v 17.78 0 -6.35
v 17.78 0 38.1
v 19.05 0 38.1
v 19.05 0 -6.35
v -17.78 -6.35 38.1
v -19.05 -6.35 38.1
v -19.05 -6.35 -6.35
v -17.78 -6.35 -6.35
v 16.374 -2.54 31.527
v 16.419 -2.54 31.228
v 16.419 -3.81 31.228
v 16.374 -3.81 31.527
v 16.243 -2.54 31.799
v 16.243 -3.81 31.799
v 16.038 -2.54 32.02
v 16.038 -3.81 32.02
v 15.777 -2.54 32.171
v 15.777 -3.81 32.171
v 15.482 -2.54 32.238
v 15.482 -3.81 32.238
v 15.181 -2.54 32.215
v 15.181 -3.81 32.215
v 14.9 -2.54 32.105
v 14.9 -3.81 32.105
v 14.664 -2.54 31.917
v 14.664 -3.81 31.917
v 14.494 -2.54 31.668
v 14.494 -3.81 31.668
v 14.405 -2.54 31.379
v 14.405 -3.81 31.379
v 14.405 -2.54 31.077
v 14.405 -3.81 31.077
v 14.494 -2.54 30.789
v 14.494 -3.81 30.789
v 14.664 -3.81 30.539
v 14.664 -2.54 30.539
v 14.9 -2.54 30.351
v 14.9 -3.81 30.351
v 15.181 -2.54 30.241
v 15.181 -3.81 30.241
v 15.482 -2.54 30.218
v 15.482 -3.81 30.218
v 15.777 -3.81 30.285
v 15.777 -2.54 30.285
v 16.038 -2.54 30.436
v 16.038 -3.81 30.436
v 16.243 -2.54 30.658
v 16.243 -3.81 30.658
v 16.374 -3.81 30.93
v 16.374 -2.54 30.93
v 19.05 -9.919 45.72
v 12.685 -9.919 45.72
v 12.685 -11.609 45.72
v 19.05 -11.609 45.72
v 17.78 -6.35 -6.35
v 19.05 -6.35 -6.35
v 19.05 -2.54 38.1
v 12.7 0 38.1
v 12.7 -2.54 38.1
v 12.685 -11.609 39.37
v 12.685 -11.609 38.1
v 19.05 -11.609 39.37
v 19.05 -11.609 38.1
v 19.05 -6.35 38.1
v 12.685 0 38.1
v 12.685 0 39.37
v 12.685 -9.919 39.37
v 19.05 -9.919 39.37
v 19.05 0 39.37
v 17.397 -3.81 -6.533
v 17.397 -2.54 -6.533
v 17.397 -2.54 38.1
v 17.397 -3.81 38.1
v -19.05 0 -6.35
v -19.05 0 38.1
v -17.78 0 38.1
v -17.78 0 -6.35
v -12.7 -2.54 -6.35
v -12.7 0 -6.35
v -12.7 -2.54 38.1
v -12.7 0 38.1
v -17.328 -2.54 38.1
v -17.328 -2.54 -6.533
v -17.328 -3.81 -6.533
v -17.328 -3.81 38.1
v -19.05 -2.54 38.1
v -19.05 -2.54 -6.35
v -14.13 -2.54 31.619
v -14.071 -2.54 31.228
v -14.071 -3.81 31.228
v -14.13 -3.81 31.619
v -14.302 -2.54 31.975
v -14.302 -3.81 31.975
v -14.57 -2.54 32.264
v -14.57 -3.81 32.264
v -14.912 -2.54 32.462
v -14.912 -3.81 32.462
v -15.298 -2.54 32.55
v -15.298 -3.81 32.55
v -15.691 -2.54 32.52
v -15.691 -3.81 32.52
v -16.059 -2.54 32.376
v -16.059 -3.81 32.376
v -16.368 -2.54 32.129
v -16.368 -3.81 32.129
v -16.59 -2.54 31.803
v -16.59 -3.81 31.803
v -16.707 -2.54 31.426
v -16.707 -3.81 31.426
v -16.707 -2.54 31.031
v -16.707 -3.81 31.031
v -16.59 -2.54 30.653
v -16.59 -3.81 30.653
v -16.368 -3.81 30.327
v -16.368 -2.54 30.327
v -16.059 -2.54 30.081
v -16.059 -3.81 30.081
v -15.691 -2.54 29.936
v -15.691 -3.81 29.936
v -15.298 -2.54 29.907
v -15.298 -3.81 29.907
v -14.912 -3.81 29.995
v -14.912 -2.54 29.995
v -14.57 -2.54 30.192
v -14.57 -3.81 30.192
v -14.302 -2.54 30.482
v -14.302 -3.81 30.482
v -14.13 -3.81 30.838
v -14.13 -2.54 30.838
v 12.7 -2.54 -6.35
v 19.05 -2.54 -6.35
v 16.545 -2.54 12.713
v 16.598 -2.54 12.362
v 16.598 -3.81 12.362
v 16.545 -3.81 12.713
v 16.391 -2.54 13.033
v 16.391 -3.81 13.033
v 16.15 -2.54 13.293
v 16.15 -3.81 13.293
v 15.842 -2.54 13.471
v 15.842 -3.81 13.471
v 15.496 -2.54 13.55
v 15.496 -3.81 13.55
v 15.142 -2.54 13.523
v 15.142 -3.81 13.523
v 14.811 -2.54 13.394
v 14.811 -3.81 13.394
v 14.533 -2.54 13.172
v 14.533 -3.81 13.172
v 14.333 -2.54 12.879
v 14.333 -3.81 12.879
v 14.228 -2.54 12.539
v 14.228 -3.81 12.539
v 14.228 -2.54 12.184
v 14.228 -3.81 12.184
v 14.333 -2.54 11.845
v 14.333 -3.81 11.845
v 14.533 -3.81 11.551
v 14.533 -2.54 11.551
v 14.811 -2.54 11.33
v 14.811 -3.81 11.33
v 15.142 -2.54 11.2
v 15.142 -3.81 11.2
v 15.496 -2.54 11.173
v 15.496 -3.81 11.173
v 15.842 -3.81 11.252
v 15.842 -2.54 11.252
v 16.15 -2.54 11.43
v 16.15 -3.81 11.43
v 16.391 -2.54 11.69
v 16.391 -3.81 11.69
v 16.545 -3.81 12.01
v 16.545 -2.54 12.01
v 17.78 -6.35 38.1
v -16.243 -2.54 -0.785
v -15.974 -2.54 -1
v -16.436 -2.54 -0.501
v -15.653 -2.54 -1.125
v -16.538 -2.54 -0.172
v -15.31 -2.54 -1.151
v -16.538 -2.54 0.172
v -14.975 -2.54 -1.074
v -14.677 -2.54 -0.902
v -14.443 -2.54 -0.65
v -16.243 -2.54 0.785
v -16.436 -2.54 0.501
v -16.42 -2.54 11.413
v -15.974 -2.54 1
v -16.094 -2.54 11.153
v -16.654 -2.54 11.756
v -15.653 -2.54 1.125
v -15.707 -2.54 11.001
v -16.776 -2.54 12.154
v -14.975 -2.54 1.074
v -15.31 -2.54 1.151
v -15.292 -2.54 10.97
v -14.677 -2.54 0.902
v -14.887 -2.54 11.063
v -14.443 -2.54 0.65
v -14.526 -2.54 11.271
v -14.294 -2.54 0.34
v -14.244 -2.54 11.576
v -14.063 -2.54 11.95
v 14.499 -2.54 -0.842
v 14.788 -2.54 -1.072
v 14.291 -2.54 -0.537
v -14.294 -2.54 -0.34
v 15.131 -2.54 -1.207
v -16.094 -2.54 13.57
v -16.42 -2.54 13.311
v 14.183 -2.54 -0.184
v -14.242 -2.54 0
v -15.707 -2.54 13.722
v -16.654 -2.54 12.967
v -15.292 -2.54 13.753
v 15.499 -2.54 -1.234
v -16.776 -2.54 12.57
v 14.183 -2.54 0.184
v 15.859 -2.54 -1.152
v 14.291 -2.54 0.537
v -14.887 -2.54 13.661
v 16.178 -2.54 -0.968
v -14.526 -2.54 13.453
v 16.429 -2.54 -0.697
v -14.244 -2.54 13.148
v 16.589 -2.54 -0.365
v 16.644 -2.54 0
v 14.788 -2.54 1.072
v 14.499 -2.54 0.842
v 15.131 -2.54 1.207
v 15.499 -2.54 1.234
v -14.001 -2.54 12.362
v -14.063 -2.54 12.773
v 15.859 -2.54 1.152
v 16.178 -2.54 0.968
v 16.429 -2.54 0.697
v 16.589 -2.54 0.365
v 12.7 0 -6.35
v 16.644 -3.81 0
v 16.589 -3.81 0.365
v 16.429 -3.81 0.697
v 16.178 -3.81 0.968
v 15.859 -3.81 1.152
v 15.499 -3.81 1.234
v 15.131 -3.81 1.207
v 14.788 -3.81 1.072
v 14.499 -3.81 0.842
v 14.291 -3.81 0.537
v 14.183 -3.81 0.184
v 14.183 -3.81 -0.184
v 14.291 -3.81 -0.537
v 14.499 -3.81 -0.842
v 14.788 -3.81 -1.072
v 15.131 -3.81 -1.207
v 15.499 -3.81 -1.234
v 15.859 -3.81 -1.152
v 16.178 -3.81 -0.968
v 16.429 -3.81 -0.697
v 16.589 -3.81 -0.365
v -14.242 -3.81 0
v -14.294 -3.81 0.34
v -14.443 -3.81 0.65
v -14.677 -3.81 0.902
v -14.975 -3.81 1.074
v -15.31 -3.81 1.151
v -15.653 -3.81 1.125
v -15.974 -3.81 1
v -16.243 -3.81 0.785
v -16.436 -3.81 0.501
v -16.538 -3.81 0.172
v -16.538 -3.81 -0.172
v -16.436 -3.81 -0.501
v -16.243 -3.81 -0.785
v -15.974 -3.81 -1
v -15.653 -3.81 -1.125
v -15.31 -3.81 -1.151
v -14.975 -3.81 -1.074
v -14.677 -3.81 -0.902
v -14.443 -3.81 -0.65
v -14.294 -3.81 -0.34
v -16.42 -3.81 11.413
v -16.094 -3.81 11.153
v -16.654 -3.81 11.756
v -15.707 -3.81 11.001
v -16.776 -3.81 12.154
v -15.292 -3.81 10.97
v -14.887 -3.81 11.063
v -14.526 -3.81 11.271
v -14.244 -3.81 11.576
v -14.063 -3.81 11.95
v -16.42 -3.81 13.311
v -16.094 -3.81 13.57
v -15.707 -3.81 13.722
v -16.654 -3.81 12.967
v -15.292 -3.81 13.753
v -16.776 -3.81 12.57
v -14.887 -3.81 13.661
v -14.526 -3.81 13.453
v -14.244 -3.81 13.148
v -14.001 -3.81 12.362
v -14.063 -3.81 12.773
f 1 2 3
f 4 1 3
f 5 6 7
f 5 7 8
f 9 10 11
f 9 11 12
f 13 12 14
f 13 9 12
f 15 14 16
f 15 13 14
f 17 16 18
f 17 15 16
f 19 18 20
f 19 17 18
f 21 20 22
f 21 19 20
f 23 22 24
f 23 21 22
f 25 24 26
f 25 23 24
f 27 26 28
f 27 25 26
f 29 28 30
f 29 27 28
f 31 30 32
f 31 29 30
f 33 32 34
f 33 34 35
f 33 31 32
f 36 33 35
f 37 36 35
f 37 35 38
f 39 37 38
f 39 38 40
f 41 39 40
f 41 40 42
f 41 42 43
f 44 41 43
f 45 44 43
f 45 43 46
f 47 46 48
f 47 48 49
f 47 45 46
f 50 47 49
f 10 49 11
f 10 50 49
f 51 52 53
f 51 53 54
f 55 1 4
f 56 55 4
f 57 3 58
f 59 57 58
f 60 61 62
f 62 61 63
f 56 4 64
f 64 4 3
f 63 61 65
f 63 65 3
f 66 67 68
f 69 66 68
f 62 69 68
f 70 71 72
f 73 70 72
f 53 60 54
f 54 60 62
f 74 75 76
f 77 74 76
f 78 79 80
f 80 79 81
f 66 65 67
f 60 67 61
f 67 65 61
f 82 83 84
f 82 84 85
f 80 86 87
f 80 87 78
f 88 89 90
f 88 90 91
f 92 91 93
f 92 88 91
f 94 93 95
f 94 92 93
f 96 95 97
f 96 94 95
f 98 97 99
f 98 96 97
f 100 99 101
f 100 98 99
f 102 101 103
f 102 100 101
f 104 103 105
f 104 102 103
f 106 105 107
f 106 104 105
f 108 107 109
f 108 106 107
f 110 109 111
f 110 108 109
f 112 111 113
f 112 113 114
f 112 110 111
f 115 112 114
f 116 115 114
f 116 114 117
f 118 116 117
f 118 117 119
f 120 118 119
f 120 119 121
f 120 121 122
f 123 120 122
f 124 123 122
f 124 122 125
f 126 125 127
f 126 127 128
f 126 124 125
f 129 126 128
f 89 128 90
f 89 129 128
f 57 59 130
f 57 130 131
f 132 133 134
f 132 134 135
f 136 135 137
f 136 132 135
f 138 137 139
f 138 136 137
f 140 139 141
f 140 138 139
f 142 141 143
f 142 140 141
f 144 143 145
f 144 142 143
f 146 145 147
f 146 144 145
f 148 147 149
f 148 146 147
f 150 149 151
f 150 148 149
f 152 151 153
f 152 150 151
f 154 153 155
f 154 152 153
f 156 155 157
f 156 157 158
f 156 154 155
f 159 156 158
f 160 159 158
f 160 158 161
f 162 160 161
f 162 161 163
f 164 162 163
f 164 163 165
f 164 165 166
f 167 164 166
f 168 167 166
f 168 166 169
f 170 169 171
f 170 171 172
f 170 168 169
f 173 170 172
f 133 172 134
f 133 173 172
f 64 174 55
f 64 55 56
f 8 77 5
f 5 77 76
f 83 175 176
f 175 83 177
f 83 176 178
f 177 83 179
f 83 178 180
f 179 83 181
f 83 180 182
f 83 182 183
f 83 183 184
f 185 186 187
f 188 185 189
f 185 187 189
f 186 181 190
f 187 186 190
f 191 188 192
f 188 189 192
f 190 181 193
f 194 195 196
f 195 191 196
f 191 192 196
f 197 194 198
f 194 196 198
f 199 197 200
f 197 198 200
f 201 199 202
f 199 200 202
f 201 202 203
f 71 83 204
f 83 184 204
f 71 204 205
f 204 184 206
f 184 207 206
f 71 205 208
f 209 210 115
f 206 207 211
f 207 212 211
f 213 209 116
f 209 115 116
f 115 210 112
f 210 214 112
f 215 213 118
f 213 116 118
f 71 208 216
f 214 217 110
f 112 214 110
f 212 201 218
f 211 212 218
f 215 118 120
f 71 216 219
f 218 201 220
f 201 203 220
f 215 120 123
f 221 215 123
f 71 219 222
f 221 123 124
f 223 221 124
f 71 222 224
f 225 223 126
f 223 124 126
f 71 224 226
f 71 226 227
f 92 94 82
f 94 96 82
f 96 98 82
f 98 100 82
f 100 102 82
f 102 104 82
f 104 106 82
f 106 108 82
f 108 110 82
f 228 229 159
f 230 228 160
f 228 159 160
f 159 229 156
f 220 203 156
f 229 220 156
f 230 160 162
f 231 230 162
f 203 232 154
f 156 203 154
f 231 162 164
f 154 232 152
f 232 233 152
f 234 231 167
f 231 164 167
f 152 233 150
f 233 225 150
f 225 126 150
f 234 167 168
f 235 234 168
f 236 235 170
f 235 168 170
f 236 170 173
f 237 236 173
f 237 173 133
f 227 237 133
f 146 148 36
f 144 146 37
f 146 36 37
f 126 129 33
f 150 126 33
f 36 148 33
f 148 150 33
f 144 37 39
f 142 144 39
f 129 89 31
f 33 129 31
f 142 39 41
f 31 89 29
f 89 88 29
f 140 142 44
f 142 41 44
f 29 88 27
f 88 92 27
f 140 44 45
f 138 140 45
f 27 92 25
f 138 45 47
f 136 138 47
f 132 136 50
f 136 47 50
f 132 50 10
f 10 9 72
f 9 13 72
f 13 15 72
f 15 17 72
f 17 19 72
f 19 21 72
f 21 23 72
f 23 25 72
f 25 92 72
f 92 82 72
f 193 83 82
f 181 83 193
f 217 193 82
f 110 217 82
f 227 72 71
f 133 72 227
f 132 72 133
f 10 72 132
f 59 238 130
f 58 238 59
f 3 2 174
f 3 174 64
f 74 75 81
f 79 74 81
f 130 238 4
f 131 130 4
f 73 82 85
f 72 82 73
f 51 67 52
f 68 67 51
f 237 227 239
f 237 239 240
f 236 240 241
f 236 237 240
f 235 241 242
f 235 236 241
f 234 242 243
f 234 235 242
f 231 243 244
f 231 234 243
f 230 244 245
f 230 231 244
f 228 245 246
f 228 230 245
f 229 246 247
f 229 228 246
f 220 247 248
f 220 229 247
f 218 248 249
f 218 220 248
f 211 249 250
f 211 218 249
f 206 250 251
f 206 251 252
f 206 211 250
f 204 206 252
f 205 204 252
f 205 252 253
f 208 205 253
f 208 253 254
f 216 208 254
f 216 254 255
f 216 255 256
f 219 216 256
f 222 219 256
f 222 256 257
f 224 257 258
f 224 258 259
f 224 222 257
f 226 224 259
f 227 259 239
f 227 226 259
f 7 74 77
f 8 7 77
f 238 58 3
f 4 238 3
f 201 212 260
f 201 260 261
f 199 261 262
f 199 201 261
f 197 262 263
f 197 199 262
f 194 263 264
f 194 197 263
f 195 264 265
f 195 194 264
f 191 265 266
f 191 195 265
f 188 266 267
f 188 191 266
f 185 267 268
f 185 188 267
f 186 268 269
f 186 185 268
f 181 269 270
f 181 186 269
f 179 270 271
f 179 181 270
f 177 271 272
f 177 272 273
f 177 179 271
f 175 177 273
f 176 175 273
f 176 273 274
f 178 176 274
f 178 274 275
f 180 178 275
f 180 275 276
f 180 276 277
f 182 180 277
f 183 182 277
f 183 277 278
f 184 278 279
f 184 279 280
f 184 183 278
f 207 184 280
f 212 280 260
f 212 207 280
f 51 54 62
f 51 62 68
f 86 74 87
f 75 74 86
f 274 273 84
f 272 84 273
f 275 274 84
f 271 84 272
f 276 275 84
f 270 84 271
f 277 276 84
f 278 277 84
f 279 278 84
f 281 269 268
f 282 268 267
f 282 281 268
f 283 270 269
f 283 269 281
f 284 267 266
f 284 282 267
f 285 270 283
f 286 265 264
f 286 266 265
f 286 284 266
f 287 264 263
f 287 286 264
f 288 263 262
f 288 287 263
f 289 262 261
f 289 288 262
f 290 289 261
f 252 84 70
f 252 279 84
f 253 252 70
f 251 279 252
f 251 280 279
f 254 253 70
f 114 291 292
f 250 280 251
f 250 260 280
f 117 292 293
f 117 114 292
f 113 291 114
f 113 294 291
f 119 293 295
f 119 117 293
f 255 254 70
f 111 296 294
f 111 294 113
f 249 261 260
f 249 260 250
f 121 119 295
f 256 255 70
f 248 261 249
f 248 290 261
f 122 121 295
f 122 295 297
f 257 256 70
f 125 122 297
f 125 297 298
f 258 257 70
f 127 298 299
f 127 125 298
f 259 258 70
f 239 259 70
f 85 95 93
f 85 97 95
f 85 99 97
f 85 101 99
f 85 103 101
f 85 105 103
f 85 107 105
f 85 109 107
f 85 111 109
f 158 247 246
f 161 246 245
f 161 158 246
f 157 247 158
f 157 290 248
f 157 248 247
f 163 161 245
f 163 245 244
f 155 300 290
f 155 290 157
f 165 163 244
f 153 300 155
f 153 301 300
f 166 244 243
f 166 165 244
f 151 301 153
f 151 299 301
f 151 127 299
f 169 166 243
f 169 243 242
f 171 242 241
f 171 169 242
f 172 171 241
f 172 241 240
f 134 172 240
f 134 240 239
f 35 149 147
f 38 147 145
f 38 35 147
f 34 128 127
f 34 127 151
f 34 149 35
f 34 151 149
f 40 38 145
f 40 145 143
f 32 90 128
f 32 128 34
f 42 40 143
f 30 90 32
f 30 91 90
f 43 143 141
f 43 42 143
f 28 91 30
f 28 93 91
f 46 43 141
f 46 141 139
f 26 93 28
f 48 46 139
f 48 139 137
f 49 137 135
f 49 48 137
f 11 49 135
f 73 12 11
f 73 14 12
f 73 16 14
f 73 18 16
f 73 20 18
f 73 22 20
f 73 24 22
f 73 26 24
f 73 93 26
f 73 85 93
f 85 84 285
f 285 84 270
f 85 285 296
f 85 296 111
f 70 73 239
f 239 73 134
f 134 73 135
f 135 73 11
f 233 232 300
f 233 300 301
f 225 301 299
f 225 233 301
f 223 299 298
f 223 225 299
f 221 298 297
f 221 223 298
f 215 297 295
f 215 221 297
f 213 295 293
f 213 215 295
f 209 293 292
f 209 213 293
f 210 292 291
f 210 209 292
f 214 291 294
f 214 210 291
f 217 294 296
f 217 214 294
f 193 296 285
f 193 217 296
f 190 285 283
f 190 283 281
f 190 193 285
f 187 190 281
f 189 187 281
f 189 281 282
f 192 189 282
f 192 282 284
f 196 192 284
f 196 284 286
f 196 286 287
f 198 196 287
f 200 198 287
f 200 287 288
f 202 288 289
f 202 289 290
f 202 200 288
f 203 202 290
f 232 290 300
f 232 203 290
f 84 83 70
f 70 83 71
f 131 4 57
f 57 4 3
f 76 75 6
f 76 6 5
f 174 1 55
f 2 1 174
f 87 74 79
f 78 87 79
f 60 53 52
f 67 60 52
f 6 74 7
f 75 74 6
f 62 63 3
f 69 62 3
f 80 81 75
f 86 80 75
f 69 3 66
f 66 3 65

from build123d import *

# Parameters (mm, degrees)
F0_W     = 1.27
F0_H     = 44.45
F1_DEPTH = 6.35
F0_W_2   = 5.08
F2_DEPTH = 2.54
F3_W     = 34.725336
F3_H     = 44.633469
F3_R     = 1.154262
F3_R_2   = 1.395496
F3_R_3   = 1.237767
F3_R_4   = 1.191646
F3_R_5   = 1.325115
F3_R_6   = 1.012659
F4_DEPTH = 1.27
F5_W     = 6.35
F5_H     = 2.54
F6_DEPTH = 1.27
F7_W     = 6.364727
F7_H     = 1.689253
F8_DEPTH = 6.35


with BuildPart() as f1:
    # F0 (on Front) → F1 (new body)
    with BuildSketch(Plane.XZ):
        with Locations((-18.415, 15.875)):
            Rectangle(F0_W, F0_H)
        with Locations((18.415, 15.875)):
            Rectangle(F0_W, F0_H)
    extrude(amount=F1_DEPTH)


with BuildPart() as f2:
    # F0 (on Front) → F2 (new body)
    with BuildSketch(Plane.XZ):
        with Locations((-18.415, 15.875)):
            Rectangle(F0_W, F0_H)
        with Locations((-15.24, 15.875)):
            Rectangle(F0_W_2, F0_H)
        with Locations((15.24, 15.875)):
            Rectangle(F0_W_2, F0_H)
        with Locations((18.415, 15.875)):
            Rectangle(F0_W, F0_H)
    extrude(amount=F2_DEPTH)


with BuildPart() as f4:
    # F3 (on face) → F4 (new body)
    with BuildSketch(Plane.XZ.offset(2.54)):
        with Locations((0.034808, 15.783266)):
            Rectangle(F3_W, F3_H)
        with Locations((-15.396533, 0)):
            Circle(F3_R, mode=Mode.SUBTRACT)
        with Locations((-15.396533, 12.361701)):
            Circle(F3_R_2, mode=Mode.SUBTRACT)
        with Locations((15.406683, 0)):
            Circle(F3_R_3, mode=Mode.SUBTRACT)
        with Locations((15.406683, 12.361701)):
            Circle(F3_R_4, mode=Mode.SUBTRACT)
        with Locations((-15.396533, 31.228127)):
            Circle(F3_R_5, mode=Mode.SUBTRACT)
        with Locations((15.406683, 31.228127)):
            Circle(F3_R_6, mode=Mode.SUBTRACT)
    extrude(amount=F4_DEPTH)


with BuildPart() as f6:
    # F5 (on face) → F6 (new body)
    with BuildSketch(Plane.XY.offset(38.1)):
        Polygon((12.7, -2.54), (12.7, 0), (12.685273, 0), (12.685273, -11.608644), (19.05, -11.608644), (19.05, -2.54), align=None)
        with Locations((15.875, -1.27)):
            Rectangle(F5_W, F5_H)
    extrude(amount=F6_DEPTH)

    # F7 (on face) → F8 (join)
    with BuildSketch(Plane.XY.offset(39.37)):
        with Locations((15.867636, -10.764017)):
            Rectangle(F7_W, F7_H)
    extrude(amount=F8_DEPTH)


solid = Compound([f1.part, f2.part, f4.part, f6.part])
